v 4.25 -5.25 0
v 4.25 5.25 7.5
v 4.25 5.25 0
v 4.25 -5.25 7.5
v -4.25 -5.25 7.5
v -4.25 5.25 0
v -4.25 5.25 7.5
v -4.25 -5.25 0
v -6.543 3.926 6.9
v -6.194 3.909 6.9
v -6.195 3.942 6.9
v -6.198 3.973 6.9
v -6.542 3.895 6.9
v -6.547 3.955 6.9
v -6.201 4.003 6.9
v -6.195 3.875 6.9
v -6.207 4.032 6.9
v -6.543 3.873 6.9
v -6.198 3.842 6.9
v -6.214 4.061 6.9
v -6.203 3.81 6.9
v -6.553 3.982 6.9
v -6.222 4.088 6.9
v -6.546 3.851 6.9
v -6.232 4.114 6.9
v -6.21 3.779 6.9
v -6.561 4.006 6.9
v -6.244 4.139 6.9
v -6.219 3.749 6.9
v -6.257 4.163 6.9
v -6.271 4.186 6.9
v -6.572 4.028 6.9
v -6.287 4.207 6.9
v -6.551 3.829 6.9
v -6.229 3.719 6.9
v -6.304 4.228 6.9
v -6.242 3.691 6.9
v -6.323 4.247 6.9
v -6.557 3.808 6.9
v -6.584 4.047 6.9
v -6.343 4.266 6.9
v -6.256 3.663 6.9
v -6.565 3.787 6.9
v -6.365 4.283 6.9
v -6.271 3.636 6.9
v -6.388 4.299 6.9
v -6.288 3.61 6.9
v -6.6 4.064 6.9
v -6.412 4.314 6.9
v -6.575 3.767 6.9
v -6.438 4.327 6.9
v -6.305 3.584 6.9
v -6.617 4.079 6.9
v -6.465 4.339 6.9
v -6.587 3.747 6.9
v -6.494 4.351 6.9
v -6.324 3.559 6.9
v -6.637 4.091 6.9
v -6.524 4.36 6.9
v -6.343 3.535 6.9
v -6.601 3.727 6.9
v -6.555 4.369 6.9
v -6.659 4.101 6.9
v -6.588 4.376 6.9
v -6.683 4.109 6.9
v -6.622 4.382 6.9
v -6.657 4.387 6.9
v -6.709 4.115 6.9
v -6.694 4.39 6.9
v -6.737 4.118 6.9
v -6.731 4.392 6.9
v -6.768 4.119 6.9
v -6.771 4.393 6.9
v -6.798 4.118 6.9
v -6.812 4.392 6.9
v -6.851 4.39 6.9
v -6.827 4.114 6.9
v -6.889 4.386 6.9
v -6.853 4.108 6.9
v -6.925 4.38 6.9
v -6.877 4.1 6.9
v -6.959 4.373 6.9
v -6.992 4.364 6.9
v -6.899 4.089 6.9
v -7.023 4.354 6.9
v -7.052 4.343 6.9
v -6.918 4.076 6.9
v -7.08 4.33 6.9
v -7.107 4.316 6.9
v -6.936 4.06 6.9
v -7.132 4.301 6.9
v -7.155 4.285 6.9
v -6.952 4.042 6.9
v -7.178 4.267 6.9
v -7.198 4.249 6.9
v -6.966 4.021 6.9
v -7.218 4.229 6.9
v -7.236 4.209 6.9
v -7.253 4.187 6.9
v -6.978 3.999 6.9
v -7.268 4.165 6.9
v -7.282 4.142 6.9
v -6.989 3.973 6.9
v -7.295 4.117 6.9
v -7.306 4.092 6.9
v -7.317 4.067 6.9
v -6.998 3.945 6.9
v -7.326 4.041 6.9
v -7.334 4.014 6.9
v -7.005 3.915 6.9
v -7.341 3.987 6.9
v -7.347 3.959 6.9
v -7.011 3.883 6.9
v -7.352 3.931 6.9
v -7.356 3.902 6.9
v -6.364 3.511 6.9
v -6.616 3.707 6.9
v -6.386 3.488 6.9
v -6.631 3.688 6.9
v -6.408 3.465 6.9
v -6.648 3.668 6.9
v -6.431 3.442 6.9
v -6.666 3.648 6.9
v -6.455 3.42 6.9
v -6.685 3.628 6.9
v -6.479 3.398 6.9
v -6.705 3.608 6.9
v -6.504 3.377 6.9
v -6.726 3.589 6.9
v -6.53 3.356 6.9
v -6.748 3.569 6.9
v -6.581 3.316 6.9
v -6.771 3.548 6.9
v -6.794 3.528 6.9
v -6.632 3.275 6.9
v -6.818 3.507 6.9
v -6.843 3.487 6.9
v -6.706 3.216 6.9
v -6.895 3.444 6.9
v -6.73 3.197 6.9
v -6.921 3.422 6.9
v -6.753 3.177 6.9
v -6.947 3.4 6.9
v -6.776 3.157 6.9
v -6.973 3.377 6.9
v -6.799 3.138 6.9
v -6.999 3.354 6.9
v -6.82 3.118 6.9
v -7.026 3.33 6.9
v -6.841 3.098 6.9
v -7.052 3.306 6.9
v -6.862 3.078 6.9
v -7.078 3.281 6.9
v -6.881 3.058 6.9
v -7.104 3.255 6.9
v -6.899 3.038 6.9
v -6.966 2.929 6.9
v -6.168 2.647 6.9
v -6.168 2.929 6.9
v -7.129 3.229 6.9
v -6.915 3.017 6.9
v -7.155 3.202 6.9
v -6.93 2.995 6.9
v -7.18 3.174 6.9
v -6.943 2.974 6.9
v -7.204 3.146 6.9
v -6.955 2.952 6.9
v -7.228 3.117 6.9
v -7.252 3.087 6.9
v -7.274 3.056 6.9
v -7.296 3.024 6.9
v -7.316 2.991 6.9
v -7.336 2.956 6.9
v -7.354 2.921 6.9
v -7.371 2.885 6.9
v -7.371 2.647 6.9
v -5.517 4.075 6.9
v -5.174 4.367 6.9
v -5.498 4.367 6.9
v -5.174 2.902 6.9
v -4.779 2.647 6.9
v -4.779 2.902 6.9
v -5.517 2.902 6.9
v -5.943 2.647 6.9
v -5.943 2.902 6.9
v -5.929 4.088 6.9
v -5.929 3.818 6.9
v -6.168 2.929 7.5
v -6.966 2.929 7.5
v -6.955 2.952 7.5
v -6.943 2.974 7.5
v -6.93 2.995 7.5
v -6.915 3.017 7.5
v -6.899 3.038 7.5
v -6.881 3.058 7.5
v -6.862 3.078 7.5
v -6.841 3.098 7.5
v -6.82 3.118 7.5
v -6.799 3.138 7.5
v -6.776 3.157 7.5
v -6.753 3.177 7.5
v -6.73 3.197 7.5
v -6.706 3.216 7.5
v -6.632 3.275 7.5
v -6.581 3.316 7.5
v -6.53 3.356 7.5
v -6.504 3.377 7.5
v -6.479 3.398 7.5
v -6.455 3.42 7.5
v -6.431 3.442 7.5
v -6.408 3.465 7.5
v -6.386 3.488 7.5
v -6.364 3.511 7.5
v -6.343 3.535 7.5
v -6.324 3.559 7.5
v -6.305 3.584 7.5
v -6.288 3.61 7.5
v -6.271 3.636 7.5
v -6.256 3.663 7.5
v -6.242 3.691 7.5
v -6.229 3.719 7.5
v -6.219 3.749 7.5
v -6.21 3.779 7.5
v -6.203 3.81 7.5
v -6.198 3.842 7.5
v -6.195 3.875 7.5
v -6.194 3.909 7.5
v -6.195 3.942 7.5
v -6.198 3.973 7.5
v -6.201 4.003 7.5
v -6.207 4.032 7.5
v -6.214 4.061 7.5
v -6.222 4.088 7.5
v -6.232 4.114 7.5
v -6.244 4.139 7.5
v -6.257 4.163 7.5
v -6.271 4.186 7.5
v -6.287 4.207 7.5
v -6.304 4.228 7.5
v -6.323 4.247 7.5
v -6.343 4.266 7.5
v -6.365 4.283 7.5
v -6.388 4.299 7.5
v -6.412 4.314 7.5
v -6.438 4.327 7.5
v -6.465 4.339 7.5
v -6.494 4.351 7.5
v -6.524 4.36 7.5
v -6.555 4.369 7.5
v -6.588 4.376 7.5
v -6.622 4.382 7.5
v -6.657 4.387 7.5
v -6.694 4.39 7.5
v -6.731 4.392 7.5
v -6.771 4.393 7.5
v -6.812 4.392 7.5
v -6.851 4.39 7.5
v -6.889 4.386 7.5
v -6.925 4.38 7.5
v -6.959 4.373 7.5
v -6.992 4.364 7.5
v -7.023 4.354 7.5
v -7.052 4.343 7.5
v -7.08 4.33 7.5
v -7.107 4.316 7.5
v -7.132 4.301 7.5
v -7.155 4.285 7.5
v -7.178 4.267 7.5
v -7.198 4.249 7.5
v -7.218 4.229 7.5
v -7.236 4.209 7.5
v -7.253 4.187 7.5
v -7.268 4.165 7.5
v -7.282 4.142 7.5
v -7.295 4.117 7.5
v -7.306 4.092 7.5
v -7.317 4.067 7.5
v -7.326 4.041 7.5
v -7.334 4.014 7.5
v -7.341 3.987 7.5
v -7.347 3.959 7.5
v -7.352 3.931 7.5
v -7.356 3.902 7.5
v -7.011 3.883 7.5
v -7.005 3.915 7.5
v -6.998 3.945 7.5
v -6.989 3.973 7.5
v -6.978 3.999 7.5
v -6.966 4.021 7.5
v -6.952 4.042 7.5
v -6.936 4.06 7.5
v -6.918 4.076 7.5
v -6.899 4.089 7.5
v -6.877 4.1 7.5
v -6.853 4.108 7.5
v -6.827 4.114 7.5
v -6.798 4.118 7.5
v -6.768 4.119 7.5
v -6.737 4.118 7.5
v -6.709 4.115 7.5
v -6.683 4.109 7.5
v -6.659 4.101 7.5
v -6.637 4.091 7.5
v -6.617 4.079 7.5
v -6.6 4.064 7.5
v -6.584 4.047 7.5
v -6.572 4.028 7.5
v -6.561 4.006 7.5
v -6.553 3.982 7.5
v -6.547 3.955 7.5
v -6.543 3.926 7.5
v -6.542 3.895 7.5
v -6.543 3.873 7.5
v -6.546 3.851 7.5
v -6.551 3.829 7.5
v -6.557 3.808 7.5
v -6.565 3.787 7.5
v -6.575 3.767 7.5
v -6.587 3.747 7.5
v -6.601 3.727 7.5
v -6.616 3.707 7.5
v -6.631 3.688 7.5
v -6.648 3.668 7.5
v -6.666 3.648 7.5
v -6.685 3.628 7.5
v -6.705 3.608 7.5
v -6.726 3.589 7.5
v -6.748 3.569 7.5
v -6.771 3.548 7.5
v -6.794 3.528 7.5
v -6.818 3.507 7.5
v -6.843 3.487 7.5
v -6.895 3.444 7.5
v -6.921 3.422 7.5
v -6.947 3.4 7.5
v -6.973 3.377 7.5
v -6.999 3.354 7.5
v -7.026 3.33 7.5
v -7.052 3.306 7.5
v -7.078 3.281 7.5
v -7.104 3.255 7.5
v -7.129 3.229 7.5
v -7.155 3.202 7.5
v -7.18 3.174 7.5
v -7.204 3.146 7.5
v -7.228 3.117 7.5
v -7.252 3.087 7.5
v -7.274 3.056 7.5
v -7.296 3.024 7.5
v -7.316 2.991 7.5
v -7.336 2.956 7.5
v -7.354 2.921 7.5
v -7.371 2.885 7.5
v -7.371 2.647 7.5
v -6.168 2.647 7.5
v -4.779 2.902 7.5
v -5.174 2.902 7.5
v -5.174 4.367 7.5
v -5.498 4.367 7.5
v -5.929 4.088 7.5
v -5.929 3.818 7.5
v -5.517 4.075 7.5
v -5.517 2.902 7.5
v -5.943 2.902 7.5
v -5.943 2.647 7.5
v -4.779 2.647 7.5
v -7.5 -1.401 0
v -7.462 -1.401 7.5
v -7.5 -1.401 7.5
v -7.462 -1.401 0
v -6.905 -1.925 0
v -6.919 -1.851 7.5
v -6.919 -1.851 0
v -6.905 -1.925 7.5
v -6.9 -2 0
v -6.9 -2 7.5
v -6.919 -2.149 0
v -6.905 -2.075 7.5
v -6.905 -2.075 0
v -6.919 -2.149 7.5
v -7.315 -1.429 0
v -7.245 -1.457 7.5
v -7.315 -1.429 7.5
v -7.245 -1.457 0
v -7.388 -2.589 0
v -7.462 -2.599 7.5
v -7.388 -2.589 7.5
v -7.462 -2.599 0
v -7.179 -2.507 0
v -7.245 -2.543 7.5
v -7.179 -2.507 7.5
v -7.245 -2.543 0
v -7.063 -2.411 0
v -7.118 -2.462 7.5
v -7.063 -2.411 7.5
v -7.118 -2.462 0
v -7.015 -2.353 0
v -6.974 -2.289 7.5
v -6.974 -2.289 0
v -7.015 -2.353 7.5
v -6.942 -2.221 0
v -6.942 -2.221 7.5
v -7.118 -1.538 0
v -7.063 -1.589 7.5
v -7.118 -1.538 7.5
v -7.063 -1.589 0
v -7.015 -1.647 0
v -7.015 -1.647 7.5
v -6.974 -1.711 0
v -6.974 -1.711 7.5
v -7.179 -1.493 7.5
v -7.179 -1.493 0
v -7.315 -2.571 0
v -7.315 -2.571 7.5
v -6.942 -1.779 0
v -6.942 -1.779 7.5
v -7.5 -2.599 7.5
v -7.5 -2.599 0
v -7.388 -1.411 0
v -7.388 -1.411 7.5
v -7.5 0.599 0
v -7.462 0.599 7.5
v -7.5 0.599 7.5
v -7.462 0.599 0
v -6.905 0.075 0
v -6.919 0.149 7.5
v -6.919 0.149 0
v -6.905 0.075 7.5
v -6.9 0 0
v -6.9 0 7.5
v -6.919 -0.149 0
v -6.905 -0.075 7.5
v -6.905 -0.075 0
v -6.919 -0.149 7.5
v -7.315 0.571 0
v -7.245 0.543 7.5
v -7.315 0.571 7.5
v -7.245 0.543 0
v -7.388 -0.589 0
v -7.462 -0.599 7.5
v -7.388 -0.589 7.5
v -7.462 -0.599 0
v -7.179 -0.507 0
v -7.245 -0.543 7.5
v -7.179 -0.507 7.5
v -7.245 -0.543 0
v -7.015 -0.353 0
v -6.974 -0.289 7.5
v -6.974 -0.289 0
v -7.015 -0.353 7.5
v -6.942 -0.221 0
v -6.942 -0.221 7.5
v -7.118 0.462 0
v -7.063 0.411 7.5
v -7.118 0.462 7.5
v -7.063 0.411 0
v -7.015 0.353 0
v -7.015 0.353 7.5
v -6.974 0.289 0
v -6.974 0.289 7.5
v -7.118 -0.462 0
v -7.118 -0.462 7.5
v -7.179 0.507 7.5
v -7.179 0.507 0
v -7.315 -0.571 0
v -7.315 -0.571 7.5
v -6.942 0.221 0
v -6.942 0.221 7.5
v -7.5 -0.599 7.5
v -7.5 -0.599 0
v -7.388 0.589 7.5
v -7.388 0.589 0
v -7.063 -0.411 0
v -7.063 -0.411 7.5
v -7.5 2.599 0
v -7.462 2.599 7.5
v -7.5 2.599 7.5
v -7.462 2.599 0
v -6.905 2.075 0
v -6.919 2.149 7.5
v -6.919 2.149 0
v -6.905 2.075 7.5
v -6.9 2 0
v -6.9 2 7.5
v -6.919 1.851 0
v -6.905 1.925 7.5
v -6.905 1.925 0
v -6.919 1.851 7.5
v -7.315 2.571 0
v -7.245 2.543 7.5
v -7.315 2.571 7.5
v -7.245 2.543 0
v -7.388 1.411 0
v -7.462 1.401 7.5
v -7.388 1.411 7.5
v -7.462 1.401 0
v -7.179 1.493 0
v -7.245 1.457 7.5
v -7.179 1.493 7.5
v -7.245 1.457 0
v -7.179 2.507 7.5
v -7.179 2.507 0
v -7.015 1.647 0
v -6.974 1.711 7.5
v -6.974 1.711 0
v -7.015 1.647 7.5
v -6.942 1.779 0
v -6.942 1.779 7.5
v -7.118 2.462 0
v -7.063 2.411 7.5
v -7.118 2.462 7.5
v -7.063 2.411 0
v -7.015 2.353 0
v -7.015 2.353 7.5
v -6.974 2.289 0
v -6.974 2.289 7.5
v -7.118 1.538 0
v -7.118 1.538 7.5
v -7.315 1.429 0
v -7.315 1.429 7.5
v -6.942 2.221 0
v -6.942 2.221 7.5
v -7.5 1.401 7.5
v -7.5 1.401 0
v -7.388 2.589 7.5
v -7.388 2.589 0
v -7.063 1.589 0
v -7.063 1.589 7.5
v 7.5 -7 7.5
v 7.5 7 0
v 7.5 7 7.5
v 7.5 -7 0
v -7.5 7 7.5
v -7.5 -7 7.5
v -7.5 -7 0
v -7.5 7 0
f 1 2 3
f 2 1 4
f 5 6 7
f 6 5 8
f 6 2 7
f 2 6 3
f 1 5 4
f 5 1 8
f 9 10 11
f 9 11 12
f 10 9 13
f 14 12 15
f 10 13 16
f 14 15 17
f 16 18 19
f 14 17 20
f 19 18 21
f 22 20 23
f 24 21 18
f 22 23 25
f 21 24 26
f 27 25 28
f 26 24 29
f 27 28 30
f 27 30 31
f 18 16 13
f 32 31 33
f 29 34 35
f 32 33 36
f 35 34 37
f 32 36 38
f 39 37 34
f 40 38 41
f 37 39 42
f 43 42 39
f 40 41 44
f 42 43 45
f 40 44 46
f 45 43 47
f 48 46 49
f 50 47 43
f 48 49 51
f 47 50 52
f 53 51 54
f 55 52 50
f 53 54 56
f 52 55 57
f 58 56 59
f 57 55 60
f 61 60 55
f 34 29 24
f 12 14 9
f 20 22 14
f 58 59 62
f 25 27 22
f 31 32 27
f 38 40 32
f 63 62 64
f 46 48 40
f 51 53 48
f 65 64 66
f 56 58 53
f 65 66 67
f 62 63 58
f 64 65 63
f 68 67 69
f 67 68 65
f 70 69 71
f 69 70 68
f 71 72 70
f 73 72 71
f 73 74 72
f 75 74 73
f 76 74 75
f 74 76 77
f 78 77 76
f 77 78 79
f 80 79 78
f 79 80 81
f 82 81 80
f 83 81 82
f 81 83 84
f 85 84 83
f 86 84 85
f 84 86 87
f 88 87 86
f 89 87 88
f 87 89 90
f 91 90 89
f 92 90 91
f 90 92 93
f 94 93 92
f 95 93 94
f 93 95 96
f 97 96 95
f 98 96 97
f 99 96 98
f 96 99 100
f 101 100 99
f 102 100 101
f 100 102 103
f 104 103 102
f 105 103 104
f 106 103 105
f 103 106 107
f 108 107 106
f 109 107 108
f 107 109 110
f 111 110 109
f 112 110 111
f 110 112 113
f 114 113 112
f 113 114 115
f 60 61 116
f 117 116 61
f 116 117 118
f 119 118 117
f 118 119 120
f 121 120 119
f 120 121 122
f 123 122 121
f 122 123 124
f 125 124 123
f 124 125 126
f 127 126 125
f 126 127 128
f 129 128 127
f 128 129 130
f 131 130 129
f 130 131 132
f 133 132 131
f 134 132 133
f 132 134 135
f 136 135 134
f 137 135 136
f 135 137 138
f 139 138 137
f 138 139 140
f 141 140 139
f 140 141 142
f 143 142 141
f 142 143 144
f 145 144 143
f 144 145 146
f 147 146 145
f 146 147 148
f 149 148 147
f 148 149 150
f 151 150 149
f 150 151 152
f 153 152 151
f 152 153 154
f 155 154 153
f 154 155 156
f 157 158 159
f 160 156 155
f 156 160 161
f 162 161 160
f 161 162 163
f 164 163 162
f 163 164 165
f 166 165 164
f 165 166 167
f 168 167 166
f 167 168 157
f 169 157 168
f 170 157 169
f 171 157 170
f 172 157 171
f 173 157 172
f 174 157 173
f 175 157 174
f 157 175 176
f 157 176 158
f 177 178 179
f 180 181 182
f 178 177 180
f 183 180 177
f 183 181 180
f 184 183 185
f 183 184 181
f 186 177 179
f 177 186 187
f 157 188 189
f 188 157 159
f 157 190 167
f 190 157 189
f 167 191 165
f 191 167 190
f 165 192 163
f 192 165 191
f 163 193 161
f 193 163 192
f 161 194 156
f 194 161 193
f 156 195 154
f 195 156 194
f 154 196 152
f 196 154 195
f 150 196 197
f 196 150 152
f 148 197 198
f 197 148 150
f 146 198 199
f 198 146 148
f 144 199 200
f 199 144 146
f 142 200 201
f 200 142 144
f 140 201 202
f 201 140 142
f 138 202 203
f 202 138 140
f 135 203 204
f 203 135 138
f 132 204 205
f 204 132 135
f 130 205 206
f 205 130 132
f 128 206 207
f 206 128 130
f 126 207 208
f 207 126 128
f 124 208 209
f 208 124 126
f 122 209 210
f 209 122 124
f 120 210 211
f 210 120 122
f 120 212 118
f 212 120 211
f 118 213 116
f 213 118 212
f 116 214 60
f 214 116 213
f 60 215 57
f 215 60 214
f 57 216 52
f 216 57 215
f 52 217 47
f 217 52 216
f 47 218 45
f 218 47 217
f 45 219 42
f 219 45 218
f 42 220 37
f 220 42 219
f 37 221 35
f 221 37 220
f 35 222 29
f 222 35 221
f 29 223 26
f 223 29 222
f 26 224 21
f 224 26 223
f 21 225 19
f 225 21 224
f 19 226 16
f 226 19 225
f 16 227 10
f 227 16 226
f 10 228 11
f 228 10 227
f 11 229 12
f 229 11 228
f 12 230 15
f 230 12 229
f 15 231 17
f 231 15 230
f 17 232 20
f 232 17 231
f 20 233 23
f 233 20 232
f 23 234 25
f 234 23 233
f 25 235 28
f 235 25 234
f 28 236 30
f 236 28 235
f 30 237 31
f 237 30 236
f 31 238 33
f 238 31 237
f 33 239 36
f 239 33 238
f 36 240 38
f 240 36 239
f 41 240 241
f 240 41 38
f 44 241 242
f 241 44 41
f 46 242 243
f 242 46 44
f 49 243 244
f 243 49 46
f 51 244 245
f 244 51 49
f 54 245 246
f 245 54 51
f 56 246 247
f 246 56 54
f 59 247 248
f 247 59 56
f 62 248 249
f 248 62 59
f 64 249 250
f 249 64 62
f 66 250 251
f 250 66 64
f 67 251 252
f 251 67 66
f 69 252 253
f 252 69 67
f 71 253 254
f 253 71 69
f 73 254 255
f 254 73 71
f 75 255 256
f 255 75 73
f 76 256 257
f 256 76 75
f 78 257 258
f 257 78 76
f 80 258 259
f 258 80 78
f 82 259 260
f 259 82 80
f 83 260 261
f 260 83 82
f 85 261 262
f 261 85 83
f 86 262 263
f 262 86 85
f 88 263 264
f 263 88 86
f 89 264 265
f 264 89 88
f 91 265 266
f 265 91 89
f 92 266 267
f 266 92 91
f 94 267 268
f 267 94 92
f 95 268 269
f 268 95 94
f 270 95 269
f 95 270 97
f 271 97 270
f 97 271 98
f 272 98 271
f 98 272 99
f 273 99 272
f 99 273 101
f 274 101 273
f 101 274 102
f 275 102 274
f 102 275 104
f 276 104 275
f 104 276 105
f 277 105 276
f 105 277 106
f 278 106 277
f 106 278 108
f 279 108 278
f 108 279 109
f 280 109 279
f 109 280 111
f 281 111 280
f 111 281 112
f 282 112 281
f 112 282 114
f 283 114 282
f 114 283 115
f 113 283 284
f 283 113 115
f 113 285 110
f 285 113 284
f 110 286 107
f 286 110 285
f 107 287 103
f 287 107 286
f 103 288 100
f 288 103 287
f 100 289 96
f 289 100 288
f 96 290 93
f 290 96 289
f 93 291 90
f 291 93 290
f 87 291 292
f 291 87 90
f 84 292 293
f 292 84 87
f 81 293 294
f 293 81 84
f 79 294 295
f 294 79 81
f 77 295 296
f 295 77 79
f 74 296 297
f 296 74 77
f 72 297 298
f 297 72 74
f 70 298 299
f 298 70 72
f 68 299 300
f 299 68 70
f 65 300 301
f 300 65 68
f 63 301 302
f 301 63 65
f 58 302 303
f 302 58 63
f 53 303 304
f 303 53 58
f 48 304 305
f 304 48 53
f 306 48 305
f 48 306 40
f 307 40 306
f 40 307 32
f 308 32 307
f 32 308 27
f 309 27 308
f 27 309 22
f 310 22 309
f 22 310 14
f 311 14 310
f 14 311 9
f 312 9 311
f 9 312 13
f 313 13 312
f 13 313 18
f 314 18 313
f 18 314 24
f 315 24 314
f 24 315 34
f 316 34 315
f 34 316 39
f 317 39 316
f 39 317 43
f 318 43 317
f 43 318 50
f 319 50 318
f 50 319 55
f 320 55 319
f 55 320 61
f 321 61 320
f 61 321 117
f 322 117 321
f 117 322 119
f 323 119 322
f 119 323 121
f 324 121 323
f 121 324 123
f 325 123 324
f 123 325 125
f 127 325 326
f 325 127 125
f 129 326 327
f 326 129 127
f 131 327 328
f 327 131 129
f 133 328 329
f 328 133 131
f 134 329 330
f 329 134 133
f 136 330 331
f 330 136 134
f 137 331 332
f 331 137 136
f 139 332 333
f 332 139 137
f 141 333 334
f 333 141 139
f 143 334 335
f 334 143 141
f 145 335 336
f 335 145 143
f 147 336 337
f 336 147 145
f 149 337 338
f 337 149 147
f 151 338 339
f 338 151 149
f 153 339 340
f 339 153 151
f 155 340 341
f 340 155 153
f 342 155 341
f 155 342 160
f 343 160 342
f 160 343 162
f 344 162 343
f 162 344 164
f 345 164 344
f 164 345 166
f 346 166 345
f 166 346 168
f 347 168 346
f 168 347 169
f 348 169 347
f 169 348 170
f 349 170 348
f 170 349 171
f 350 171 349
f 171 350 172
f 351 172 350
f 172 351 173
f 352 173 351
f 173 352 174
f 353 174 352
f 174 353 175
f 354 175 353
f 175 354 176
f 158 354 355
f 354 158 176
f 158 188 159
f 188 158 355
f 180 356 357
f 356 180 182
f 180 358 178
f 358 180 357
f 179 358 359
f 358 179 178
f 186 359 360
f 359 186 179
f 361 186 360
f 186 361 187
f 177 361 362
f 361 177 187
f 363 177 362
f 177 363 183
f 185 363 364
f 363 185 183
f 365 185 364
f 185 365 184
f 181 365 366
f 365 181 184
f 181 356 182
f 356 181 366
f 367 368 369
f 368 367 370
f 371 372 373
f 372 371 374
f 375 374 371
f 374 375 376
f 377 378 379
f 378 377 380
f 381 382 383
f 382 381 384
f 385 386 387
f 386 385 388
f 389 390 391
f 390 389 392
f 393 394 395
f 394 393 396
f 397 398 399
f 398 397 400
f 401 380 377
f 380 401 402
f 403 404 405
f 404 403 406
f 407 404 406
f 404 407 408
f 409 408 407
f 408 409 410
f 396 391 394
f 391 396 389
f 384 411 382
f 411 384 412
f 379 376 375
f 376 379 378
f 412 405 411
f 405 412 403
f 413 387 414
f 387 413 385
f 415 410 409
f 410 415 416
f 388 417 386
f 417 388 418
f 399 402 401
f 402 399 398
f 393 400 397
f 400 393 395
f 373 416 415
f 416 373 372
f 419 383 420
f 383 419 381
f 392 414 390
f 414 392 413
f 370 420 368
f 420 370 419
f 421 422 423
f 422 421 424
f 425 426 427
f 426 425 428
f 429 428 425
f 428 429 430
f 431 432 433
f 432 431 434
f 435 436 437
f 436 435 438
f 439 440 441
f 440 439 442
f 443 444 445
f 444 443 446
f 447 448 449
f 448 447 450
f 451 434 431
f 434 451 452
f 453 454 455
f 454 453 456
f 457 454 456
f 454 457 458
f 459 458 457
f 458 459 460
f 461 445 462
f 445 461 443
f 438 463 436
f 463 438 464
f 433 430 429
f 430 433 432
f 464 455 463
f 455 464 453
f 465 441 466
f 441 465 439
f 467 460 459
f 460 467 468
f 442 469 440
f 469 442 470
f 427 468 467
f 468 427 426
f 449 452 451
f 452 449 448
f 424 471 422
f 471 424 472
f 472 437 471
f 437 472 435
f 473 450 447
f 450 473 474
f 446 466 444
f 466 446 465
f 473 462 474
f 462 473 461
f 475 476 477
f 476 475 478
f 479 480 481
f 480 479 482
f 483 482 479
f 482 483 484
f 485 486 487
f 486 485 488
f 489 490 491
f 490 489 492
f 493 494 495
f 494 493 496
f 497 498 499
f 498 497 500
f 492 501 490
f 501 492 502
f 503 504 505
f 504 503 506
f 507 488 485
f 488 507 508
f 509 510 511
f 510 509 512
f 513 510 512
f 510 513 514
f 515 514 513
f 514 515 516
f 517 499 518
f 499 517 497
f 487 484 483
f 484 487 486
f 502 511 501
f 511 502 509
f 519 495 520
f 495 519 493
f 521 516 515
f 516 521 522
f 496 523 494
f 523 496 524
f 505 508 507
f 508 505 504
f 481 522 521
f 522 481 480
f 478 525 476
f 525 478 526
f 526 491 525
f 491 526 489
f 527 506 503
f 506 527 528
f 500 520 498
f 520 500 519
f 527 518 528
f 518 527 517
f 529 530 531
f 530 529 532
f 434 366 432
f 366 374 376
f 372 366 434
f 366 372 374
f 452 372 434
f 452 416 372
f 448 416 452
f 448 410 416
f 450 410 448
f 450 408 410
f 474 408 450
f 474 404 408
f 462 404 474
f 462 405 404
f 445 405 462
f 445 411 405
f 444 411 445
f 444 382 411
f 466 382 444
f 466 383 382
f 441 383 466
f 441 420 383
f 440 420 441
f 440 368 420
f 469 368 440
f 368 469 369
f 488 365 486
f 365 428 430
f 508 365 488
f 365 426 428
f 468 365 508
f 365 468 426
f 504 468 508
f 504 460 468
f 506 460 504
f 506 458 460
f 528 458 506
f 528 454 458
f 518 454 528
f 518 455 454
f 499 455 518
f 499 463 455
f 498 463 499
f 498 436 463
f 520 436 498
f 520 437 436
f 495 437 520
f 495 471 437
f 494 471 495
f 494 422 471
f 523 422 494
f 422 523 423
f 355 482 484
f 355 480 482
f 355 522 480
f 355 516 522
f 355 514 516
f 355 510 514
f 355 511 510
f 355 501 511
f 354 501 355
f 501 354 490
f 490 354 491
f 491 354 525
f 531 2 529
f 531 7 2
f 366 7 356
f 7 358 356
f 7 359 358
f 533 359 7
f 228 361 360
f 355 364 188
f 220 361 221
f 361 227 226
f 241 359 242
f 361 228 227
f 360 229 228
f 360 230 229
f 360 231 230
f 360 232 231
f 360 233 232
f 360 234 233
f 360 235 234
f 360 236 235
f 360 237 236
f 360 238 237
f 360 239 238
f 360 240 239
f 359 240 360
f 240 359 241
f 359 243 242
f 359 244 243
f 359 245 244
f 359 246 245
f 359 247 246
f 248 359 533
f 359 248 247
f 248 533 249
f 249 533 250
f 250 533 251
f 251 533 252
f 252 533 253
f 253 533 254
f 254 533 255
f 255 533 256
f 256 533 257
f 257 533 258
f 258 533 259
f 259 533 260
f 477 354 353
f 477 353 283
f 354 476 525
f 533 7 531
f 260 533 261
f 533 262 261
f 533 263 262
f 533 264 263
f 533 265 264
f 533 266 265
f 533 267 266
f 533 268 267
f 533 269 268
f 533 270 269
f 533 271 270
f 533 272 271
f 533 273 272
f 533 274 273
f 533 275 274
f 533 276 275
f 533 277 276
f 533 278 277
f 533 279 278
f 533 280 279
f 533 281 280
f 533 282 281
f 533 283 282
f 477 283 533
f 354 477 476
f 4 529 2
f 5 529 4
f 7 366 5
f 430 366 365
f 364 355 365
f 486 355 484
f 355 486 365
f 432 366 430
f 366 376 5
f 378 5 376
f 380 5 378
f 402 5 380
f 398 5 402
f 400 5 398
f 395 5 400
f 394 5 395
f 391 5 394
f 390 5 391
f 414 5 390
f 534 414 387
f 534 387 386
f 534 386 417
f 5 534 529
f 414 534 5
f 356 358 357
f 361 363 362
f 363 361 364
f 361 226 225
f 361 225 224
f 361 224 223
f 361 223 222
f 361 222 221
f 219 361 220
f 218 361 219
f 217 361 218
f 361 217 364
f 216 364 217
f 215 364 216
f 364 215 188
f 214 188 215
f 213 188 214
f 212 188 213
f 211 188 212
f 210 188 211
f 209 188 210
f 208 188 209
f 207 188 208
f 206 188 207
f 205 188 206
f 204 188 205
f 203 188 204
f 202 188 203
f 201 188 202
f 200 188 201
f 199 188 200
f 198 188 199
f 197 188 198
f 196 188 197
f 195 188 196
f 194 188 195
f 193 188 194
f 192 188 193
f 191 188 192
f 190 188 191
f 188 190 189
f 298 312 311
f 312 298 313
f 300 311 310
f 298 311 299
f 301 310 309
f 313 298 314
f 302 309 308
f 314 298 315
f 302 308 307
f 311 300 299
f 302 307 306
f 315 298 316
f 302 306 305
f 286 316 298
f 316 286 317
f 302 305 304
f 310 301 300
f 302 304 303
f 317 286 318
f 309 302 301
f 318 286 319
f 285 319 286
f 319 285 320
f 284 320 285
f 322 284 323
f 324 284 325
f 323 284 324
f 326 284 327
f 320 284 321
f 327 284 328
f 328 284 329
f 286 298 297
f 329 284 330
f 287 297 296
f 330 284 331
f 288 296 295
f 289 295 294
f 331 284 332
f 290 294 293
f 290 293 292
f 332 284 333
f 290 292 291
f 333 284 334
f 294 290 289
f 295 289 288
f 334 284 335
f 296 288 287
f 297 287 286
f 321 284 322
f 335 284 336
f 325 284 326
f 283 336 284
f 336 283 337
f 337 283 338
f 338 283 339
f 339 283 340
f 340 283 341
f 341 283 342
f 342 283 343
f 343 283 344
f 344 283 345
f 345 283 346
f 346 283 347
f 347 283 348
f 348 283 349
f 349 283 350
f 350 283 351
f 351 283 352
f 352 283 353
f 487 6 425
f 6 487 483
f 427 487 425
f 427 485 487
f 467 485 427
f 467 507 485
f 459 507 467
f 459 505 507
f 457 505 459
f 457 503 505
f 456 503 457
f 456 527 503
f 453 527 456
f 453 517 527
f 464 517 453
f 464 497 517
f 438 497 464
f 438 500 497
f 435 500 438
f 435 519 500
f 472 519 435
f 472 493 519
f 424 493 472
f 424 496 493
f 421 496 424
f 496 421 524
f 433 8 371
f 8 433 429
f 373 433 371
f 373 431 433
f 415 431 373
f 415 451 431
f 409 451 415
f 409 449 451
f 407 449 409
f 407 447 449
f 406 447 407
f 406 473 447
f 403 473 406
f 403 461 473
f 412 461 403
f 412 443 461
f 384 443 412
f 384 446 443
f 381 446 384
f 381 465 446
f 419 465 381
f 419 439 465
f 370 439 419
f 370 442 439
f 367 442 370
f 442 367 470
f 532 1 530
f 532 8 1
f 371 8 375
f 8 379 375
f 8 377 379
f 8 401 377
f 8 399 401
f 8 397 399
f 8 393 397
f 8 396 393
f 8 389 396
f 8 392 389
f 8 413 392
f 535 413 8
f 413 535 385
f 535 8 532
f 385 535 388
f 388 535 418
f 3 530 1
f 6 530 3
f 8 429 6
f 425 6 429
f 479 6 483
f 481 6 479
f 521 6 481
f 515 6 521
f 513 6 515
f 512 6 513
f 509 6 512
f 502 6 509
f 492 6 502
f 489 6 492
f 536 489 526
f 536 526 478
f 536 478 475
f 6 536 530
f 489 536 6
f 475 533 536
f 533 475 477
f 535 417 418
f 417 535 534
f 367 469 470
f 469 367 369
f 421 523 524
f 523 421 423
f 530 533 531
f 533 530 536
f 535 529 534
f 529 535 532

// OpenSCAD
$fn = 50;

difference() {
	union() {
		translate(v = [0, -5, 0]) {
			rotate(a = [0, 0, 0]) {
				difference() {
					union() {
						translate(v = [-7.5, -2.0, 0]) {
							cube(size = [15.0, 14.0, 7.5]);
						}
					}
					union() {
						translate(v = [-4.25, -0.25, -0.1]) {
							cube(size = [8.5, 10.5, 7.7]);
						}
						translate(v = [-6.1, 8.5, 6.9]) {
							linear_extrude(height = 0.7) {
								text(font = "Arial:style=Bold", halign = "center", size = 1.8, text = "21", valign = "center");
							}
						}
						translate(v = [-7.5, 3, -0.1]) {
							cylinder(h = 7.7, r = 0.6);
						}
						translate(v = [-7.5, 5, -0.1]) {
							cylinder(h = 7.7, r = 0.6);
						}
						translate(v = [-7.5, 7, -0.1]) {
							cylinder(h = 7.7, r = 0.6);
						}
					}
				}
			}
		}
	}
	union();
}
